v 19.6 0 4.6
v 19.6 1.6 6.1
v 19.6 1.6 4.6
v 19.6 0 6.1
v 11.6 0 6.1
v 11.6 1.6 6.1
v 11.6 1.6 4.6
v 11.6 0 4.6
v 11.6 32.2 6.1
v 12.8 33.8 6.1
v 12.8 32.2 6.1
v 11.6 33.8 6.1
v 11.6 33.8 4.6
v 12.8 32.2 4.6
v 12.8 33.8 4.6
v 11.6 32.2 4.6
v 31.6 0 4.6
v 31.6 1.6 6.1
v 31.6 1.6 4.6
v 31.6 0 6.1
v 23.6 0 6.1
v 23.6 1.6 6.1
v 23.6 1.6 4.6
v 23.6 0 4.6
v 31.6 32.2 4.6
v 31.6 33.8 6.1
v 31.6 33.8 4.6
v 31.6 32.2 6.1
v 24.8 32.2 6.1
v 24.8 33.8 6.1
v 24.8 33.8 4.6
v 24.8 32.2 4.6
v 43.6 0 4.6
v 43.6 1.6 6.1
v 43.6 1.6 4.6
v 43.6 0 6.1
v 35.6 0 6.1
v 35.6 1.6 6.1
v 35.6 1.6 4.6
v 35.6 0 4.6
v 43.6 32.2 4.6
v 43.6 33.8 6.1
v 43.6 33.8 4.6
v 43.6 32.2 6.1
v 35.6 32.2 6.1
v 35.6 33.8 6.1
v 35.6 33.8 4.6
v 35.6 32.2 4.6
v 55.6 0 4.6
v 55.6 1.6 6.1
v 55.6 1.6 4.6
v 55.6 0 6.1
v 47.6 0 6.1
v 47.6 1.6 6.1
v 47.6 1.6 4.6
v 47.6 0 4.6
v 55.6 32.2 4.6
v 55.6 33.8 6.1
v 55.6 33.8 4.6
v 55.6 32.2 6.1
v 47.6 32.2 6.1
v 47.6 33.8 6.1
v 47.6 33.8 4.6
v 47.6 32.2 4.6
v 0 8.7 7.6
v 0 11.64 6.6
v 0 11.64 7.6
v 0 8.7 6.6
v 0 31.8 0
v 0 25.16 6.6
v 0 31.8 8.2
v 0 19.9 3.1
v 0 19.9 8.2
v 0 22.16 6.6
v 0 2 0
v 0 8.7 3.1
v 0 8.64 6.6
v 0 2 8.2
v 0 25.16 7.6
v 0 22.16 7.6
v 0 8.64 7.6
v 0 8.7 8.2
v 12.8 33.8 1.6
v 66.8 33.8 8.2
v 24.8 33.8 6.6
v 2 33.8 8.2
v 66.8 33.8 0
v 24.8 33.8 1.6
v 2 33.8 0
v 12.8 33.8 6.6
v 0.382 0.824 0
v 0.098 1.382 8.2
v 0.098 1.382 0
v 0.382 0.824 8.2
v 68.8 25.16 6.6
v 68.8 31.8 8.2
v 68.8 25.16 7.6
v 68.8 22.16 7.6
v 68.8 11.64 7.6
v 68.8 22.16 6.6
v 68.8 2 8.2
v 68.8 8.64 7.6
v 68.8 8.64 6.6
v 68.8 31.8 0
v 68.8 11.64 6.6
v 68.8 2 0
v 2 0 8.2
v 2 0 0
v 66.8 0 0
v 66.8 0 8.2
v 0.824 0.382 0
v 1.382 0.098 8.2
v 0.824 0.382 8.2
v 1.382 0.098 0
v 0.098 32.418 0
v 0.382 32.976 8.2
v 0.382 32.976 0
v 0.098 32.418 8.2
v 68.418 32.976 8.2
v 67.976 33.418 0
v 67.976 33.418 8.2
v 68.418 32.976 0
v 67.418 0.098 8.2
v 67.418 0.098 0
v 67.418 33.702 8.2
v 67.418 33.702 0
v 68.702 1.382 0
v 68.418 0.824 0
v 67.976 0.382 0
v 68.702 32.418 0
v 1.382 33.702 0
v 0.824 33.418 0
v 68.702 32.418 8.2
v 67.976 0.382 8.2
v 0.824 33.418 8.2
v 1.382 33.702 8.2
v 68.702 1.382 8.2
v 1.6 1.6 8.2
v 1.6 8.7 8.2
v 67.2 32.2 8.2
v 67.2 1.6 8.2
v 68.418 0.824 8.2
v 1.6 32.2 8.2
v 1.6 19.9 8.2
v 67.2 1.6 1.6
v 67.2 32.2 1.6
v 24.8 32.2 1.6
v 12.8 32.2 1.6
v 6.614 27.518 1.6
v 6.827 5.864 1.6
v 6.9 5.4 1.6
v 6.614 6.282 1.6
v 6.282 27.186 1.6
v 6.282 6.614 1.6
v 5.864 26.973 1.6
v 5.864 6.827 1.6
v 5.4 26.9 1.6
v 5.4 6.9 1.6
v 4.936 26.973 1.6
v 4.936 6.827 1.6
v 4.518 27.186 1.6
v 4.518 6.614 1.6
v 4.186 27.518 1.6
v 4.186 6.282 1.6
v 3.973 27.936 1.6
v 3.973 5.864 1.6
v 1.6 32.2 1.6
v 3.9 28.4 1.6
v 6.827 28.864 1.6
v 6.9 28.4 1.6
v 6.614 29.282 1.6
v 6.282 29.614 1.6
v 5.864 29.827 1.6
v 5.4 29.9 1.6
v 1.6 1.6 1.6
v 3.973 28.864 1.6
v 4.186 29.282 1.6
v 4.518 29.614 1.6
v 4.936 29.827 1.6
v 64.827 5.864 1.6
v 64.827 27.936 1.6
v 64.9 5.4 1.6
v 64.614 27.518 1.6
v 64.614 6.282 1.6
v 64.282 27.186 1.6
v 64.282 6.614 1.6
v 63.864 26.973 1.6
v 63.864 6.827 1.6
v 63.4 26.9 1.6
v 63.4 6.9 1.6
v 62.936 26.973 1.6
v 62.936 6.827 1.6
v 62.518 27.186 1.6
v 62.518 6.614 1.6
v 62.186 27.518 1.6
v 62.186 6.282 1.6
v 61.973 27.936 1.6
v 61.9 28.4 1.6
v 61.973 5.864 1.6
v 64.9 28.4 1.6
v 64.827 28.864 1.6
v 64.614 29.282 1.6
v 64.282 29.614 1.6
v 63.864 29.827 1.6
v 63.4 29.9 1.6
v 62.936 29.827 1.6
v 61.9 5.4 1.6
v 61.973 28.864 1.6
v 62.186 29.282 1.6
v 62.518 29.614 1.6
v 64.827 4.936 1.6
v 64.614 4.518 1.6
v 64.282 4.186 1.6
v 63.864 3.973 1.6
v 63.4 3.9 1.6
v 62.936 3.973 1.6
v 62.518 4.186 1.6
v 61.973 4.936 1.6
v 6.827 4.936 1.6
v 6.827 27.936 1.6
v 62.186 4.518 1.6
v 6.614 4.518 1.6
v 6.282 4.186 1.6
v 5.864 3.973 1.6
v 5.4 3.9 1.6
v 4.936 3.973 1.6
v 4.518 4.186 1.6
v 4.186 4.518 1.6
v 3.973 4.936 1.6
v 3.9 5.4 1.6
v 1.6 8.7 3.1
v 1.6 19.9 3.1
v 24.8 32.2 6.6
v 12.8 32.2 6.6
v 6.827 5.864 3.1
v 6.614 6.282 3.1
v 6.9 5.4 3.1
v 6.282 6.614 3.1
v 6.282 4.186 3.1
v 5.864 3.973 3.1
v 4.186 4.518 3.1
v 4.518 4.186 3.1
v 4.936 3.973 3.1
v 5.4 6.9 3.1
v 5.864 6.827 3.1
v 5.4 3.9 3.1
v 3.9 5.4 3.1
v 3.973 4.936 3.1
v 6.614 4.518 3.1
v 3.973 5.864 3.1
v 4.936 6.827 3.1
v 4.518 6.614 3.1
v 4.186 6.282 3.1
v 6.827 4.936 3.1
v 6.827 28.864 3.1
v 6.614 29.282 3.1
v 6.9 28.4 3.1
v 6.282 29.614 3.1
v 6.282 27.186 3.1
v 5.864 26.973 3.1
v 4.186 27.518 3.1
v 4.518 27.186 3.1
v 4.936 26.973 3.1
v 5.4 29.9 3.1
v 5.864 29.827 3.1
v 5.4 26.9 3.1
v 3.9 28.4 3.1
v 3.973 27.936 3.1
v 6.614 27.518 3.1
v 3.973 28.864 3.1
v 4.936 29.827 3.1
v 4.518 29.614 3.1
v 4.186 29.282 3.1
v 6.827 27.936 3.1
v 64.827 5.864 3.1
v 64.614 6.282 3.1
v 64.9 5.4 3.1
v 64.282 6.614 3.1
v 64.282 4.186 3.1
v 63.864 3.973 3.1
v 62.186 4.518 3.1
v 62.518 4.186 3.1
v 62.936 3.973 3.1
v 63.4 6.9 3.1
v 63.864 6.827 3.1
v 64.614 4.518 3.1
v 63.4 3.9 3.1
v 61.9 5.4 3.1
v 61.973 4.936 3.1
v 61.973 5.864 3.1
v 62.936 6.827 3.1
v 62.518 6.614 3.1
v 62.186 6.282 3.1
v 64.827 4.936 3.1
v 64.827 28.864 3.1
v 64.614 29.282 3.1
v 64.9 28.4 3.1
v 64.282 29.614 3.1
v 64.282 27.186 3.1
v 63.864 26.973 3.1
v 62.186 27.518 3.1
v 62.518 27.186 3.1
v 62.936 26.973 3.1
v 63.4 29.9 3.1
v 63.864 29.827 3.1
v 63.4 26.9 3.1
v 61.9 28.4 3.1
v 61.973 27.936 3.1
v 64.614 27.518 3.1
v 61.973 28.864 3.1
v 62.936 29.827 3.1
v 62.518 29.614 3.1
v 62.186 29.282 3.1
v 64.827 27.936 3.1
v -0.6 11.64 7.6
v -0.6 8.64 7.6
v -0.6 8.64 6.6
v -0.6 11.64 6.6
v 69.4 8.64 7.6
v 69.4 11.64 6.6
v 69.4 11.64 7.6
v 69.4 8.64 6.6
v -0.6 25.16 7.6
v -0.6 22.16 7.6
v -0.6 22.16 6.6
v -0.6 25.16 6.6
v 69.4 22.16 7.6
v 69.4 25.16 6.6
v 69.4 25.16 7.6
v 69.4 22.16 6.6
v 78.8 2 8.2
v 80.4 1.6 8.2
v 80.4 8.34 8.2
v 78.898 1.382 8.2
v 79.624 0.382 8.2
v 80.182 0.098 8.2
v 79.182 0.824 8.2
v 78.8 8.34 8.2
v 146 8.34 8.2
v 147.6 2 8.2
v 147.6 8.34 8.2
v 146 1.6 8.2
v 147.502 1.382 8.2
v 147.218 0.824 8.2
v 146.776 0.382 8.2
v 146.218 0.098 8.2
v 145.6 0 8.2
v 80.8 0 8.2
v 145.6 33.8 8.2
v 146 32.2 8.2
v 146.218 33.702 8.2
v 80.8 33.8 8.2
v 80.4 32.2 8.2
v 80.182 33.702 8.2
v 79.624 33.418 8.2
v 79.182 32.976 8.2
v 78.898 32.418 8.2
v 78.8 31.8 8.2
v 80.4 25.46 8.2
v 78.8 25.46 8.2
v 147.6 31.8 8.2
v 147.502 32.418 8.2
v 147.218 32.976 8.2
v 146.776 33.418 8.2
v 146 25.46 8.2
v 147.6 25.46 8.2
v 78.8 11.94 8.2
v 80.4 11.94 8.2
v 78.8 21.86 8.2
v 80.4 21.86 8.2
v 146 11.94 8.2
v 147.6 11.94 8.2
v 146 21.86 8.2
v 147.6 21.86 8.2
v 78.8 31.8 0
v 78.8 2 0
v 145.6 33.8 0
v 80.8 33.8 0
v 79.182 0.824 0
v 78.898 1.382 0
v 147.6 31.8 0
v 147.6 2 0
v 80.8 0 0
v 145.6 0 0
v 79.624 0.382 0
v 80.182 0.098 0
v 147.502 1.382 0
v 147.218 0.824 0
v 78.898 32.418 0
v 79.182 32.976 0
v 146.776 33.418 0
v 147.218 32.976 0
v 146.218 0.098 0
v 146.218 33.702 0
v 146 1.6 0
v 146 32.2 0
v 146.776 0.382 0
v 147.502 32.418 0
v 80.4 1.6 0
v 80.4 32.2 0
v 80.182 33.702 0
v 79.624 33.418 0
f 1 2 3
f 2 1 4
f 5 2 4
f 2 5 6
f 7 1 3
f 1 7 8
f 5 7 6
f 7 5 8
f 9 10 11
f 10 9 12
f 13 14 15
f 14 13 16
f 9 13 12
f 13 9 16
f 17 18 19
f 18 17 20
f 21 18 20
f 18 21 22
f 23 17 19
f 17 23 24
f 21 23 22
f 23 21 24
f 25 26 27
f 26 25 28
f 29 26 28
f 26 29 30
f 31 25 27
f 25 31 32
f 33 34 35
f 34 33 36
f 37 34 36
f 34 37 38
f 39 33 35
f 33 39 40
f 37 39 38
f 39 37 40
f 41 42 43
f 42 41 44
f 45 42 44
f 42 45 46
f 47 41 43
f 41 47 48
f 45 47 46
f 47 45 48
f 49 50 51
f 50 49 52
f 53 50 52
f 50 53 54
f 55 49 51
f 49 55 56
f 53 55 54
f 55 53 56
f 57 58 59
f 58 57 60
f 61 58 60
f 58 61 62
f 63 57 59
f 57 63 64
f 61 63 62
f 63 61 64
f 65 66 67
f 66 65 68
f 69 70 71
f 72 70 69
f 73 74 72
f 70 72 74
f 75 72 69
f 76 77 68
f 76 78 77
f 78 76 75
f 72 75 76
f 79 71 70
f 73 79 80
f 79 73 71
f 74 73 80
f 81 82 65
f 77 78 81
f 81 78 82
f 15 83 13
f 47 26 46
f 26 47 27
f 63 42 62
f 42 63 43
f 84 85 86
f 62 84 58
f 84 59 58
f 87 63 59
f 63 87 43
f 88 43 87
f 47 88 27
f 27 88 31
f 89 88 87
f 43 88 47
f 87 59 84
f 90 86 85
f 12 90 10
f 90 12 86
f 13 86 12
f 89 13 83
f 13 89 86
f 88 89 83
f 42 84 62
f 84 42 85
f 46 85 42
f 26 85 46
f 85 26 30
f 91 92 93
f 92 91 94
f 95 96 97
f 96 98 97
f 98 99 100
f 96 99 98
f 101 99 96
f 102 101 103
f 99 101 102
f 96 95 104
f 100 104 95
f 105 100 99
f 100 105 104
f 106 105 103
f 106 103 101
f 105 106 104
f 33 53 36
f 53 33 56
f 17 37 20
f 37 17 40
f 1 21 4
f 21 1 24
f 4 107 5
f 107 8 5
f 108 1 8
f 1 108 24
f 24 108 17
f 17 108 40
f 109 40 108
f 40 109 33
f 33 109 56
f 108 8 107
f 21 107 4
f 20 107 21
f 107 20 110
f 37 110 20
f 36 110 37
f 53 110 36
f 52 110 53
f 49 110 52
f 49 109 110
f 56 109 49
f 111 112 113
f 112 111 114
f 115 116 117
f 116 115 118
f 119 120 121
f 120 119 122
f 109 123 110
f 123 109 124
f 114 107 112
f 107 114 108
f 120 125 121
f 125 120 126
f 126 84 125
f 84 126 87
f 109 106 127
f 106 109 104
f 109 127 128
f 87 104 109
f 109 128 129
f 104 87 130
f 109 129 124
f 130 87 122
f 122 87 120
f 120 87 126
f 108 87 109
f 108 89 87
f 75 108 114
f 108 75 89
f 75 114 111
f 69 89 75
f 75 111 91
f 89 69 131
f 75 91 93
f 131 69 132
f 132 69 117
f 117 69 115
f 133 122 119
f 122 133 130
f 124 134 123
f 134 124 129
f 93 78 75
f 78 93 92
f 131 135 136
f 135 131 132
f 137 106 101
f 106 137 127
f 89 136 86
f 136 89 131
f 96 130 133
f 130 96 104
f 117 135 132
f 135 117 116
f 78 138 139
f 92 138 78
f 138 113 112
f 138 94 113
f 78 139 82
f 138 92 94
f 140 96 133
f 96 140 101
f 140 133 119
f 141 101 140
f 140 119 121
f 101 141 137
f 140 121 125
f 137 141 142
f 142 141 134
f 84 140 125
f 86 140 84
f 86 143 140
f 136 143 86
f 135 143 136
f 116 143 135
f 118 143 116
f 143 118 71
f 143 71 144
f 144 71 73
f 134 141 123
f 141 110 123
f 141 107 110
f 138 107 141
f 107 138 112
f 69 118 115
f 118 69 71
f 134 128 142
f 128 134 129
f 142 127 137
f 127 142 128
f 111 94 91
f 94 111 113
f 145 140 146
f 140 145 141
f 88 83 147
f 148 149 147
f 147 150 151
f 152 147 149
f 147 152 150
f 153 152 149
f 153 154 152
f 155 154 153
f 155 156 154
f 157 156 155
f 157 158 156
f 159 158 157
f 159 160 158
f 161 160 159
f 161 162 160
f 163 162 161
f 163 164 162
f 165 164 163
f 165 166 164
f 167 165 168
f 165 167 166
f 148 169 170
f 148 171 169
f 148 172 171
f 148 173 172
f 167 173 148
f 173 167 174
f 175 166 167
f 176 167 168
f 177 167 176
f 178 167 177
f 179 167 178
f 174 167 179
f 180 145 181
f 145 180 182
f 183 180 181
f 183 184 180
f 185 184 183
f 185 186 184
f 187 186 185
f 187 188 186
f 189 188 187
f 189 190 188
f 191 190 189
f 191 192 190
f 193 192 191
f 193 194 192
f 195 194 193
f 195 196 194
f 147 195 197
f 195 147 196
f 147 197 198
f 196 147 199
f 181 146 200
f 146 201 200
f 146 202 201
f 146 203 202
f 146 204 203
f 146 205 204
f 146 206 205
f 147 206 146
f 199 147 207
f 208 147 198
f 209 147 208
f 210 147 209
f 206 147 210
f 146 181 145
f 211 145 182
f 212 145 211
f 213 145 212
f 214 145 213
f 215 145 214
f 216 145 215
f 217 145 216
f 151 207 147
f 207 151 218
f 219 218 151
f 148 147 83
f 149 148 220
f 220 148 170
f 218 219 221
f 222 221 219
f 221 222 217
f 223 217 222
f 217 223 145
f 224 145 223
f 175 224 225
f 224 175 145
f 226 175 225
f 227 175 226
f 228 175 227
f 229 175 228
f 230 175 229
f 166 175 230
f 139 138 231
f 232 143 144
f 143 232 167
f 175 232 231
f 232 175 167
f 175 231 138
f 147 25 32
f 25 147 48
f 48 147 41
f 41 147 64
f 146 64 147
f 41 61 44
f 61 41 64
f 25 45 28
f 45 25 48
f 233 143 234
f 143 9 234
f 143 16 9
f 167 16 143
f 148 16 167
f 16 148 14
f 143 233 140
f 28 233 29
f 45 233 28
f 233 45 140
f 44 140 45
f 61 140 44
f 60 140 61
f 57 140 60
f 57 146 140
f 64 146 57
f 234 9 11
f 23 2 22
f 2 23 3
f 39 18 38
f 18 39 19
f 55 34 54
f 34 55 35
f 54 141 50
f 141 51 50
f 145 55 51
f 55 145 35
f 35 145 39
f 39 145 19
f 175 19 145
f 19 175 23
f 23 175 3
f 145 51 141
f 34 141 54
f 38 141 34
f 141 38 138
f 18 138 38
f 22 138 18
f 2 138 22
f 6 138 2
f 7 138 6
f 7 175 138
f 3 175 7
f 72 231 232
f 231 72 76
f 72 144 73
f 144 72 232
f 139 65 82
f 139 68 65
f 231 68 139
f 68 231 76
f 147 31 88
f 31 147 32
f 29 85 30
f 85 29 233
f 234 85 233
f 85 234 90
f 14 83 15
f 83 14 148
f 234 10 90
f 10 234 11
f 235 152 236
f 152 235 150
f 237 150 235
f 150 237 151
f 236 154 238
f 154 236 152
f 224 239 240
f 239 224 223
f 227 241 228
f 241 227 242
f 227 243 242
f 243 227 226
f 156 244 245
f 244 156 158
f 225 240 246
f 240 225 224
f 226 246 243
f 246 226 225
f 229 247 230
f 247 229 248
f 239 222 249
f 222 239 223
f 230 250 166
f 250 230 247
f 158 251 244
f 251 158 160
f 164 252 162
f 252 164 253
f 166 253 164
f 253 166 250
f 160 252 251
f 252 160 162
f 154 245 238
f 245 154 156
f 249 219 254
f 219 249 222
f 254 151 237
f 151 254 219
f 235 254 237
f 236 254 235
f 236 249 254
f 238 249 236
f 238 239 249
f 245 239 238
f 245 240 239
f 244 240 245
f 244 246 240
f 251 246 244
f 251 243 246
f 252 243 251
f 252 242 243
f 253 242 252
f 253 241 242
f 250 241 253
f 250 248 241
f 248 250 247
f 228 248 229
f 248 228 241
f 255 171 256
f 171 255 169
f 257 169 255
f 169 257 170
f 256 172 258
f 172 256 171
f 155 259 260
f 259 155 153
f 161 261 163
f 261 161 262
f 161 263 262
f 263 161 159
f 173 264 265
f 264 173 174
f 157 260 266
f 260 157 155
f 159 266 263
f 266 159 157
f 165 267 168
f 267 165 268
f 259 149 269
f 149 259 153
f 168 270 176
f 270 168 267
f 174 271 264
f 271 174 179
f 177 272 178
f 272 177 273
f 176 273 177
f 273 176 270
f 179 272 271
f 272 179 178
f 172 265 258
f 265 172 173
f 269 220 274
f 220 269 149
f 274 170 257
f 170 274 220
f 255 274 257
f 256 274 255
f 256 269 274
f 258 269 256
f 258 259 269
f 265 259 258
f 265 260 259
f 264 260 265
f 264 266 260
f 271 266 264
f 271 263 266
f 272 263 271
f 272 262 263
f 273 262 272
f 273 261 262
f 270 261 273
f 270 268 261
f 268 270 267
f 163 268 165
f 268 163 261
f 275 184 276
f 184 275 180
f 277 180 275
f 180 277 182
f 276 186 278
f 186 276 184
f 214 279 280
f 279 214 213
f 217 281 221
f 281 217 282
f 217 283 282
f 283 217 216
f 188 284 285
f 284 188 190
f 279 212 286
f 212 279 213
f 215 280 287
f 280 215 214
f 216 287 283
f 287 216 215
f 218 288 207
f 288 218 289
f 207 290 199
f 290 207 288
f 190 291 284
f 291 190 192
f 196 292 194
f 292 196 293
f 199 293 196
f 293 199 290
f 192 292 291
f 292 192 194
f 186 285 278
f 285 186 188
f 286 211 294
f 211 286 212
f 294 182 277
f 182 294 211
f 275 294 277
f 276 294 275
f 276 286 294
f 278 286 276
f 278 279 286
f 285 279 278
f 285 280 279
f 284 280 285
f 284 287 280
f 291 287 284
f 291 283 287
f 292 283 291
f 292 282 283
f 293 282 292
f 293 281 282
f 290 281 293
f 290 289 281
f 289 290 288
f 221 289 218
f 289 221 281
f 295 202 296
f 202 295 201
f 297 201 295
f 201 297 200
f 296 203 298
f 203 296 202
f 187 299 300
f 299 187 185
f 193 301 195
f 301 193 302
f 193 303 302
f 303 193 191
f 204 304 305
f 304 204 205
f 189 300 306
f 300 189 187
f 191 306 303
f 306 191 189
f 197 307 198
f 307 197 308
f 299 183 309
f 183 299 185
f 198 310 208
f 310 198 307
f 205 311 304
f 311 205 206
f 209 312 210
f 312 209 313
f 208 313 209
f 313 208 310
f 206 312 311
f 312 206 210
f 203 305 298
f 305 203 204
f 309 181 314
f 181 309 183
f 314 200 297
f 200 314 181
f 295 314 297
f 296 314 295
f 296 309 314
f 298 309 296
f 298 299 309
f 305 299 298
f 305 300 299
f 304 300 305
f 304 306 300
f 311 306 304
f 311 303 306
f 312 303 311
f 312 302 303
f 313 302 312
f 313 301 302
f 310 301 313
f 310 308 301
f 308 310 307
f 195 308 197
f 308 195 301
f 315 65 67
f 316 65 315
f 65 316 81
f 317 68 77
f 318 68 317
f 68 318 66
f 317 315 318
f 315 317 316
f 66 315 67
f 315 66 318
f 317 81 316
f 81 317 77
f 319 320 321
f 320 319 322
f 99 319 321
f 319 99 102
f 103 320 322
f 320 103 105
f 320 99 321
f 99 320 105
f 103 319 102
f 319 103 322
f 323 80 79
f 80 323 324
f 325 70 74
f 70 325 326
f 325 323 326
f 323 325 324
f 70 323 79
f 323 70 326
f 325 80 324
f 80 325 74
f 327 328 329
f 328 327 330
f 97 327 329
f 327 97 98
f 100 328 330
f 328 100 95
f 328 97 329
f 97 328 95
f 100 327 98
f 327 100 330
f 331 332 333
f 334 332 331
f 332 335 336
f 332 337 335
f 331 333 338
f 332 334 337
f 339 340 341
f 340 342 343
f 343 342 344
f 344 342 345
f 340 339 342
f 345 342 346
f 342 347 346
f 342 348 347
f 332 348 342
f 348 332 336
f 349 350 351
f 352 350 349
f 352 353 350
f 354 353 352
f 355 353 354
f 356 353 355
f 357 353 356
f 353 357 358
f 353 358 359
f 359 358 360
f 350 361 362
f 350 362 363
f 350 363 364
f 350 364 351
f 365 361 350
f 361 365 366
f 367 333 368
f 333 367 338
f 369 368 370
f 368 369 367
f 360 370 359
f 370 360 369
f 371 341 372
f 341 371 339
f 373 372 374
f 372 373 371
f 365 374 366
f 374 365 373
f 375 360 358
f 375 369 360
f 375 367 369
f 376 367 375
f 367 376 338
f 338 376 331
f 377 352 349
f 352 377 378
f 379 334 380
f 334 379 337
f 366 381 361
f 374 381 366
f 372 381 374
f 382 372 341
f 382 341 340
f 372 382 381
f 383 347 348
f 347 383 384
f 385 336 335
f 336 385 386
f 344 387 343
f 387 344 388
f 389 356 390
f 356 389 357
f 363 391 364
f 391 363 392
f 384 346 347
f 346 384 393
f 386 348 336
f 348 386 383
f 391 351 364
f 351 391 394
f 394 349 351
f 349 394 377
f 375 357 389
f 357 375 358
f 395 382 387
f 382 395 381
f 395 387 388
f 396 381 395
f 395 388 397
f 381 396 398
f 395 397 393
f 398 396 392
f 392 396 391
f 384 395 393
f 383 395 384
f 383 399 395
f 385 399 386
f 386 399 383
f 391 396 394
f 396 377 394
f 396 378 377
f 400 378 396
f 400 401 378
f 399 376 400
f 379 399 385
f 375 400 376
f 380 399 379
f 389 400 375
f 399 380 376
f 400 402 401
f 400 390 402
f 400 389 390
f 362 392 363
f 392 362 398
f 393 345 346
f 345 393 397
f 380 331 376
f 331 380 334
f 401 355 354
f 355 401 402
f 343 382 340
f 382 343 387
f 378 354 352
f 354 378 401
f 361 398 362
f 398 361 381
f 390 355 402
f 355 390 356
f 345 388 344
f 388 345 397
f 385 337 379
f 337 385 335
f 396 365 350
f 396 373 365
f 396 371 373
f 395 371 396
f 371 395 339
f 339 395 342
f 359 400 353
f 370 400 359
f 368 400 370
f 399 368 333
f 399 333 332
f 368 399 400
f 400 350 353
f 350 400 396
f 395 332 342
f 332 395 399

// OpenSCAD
// Wireless Display Dongle — Lite-kotelo (Pi Zero 2 W)
// Mitat perustuvat Raspberry Pi Zero 2 W:n virallisiin mittoihin
//
// Tulosta: PETG tai PLA, 0.2mm layer height, ei tukia tarvita
// Kotelo on kaksiosainen: pohja + kansi snap-fit-lukituksella

/* [Asetukset] */
// Seinämän paksuus (mm)
wall = 1.6;
// Toleranssi (mm) - säädä tulostimen mukaan
tol = 0.3;

/* [Pi Zero 2 W mitat] */
pcb_w = 65.0;    // leveys
pcb_d = 30.0;    // syvyys
pcb_h = 1.0;     // piirilevyn paksuus
comp_h = 3.5;    // komponenttien korkeus piirilevyn yläpuolella
bottom_h = 1.5;  // komponenttien korkeus piirilevyn alapuolella

/* [Liittimet - etäisyydet piirilevyn reunasta] */
// Mini-HDMI: vasen reuna, piirilevyn keskeltä
hdmi_offset_x = 12.4;  // keskikohta vasemmasta reunasta
hdmi_w = 11.2;
hdmi_h = 3.5;

// Micro-USB (virta): vasen reuna
usb_offset_x = 41.4;   // keskikohta vasemmasta reunasta
usb_w = 8.0;
usb_h = 3.0;

// microSD: oikea reuna (pitkä sivu)
sd_offset_y = 16.9;    // keskikohta alareunasta
sd_w = 12.0;
sd_h = 1.5;

/* [Jäähdytys] */
heatsink_w = 14.0;
heatsink_d = 14.0;
heatsink_h = 3.0;

/* [Lasketut mitat] */
inner_w = pcb_w + tol * 2;
inner_d = pcb_d + tol * 2;
inner_h = bottom_h + pcb_h + comp_h + heatsink_h + 1.0;  // +1mm ilmarako

outer_w = inner_w + wall * 2;
outer_d = inner_d + wall * 2;
outer_h = inner_h + wall * 2;

// Snap-fit korvakkeet
snap_w = 3.0;
snap_h = 1.0;
snap_depth = 0.6;

module case_bottom() {
    difference() {
        // Ulkokuori
        rounded_box(outer_w, outer_d, outer_h / 2 + wall, 2);

        // Sisätila
        translate([wall, wall, wall])
            cube([inner_w, inner_d, outer_h]);

        // Mini-HDMI-aukko (vasen pääty)
        translate([-1, wall + tol + hdmi_offset_x - hdmi_w/2, wall + bottom_h])
            cube([wall + 2, hdmi_w, hdmi_h + 2]);

        // Micro-USB-aukko (vasen pääty)
        translate([-1, wall + tol + usb_offset_x - usb_w/2, wall + bottom_h])
            cube([wall + 2, usb_w, usb_h + 2]);

        // microSD-aukko (pitkä sivu, oikea)
        translate([wall + tol + sd_offset_y - sd_w/2, outer_d - wall - 1, wall])
            cube([sd_w, wall + 2, sd_h + bottom_h + 2]);

        // Tuuletusaukot (yläpinta - tässä puolikkaassa sivut)
        for (i = [0:3]) {
            translate([wall + 10 + i * 12, -1, outer_h / 2 - 2])
                cube([8, wall + 2, 1.5]);
            translate([wall + 10 + i * 12, outer_d - wall - 1, outer_h / 2 - 2])
                cube([8, wall + 2, 1.5]);
        }
    }

    // Piirilevyn tuet (4 kulmaa)
    for (x = [wall + tol + 3.5, wall + tol + pcb_w - 3.5])
        for (y = [wall + tol + 3.5, wall + tol + pcb_d - 3.5])
            translate([x, y, wall])
                cylinder(h = bottom_h, r = 1.5, $fn = 20);

    // Snap-fit korvakkeet
    for (y = [outer_d * 0.3, outer_d * 0.7]) {
        translate([-snap_depth, y - snap_w/2, outer_h/2])
            cube([snap_depth, snap_w, snap_h]);
        translate([outer_w, y - snap_w/2, outer_h/2])
            cube([snap_depth, snap_w, snap_h]);
    }
}

module case_top() {
    difference() {
        // Ulkokuori
        rounded_box(outer_w, outer_d, outer_h / 2 + wall, 2);

        // Sisätila
        translate([wall, wall, -1])
            cube([inner_w, inner_d, outer_h]);

        // Tuuletusaukot (yläpinta)
        for (i = [0:2]) {
            translate([wall + 15 + i * 14, wall + 8, outer_h/2])
                cube([10, inner_d - 16, wall + 2]);
        }

        // Snap-fit urat
        for (y = [outer_d * 0.3, outer_d * 0.7]) {
            translate([-1, y - snap_w/2 - tol, -snap_h - tol])
                cube([wall + 1 + snap_depth + tol, snap_w + tol*2, snap_h + tol]);
            translate([outer_w - wall - snap_depth - tol, y - snap_w/2 - tol, -snap_h - tol])
                cube([wall + 1 + snap_depth + tol, snap_w + tol*2, snap_h + tol]);
        }
    }
}

module rounded_box(w, d, h, r) {
    hull() {
        for (x = [r, w - r])
            for (y = [r, d - r])
                translate([x, y, 0])
                    cylinder(h = h, r = r, $fn = 20);
    }
}

// --- Renderöinti ---
// Pohja
case_bottom();

// Kansi (siirretty viereen tulostusta varten)
translate([outer_w + 10, 0, outer_h / 2 + wall])
    mirror([0, 0, 1])
        case_top();
